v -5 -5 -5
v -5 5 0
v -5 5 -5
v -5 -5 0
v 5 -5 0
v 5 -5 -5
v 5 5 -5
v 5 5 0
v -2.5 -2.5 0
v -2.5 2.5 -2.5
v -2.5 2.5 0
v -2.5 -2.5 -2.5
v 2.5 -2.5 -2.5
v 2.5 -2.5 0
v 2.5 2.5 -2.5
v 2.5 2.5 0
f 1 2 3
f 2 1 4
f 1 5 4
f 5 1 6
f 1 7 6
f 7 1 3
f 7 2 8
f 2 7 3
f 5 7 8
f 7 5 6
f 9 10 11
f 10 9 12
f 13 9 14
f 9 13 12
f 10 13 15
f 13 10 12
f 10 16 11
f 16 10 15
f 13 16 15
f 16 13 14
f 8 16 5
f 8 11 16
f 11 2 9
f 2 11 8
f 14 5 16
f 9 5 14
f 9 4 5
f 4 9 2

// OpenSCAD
// In CGAL mode, there should be a cavity
// The problem appears to be that we don't create a correct Nef Polyhedron from
// the polyset, probably already being wrong when converting to a Polyhedron
difference() {
  polyhedron(convexity=2, faces=[[2,1,0],[3,1,2],[4,0,1],[4,1,5],[4,2,0],[6,2,4],[6,3,2],[7,3,6],[5,1,3],[5,3,7],[6,4,5],[6,5,7],[9,10,8],[9,11,10],[8,12,9],[9,12,13],[10,12,8],[10,14,12],[11,14,10],[11,15,14],[9,13,11],[11,13,15],[12,14,13],[13,14,15]],
points=[[-5,-5,-5],[-5,-5,5],[-5,5,-5],[-5,5,5],[5,-5,-5],[5,-5,5],[5,5,-5],[5,5,5],[-2.5,-2.5,-2.5],[-2.5,-2.5,2.5],[-2.5,2.5,-2.5],[-2.5,2.5,2.5],[2.5,-2.5,-2.5],[2.5,-2.5,2.5],[2.5,2.5,-2.5],[2.5,2.5,2.5]]);
  translate([0,0,10]) cube(20, center=true);
}
